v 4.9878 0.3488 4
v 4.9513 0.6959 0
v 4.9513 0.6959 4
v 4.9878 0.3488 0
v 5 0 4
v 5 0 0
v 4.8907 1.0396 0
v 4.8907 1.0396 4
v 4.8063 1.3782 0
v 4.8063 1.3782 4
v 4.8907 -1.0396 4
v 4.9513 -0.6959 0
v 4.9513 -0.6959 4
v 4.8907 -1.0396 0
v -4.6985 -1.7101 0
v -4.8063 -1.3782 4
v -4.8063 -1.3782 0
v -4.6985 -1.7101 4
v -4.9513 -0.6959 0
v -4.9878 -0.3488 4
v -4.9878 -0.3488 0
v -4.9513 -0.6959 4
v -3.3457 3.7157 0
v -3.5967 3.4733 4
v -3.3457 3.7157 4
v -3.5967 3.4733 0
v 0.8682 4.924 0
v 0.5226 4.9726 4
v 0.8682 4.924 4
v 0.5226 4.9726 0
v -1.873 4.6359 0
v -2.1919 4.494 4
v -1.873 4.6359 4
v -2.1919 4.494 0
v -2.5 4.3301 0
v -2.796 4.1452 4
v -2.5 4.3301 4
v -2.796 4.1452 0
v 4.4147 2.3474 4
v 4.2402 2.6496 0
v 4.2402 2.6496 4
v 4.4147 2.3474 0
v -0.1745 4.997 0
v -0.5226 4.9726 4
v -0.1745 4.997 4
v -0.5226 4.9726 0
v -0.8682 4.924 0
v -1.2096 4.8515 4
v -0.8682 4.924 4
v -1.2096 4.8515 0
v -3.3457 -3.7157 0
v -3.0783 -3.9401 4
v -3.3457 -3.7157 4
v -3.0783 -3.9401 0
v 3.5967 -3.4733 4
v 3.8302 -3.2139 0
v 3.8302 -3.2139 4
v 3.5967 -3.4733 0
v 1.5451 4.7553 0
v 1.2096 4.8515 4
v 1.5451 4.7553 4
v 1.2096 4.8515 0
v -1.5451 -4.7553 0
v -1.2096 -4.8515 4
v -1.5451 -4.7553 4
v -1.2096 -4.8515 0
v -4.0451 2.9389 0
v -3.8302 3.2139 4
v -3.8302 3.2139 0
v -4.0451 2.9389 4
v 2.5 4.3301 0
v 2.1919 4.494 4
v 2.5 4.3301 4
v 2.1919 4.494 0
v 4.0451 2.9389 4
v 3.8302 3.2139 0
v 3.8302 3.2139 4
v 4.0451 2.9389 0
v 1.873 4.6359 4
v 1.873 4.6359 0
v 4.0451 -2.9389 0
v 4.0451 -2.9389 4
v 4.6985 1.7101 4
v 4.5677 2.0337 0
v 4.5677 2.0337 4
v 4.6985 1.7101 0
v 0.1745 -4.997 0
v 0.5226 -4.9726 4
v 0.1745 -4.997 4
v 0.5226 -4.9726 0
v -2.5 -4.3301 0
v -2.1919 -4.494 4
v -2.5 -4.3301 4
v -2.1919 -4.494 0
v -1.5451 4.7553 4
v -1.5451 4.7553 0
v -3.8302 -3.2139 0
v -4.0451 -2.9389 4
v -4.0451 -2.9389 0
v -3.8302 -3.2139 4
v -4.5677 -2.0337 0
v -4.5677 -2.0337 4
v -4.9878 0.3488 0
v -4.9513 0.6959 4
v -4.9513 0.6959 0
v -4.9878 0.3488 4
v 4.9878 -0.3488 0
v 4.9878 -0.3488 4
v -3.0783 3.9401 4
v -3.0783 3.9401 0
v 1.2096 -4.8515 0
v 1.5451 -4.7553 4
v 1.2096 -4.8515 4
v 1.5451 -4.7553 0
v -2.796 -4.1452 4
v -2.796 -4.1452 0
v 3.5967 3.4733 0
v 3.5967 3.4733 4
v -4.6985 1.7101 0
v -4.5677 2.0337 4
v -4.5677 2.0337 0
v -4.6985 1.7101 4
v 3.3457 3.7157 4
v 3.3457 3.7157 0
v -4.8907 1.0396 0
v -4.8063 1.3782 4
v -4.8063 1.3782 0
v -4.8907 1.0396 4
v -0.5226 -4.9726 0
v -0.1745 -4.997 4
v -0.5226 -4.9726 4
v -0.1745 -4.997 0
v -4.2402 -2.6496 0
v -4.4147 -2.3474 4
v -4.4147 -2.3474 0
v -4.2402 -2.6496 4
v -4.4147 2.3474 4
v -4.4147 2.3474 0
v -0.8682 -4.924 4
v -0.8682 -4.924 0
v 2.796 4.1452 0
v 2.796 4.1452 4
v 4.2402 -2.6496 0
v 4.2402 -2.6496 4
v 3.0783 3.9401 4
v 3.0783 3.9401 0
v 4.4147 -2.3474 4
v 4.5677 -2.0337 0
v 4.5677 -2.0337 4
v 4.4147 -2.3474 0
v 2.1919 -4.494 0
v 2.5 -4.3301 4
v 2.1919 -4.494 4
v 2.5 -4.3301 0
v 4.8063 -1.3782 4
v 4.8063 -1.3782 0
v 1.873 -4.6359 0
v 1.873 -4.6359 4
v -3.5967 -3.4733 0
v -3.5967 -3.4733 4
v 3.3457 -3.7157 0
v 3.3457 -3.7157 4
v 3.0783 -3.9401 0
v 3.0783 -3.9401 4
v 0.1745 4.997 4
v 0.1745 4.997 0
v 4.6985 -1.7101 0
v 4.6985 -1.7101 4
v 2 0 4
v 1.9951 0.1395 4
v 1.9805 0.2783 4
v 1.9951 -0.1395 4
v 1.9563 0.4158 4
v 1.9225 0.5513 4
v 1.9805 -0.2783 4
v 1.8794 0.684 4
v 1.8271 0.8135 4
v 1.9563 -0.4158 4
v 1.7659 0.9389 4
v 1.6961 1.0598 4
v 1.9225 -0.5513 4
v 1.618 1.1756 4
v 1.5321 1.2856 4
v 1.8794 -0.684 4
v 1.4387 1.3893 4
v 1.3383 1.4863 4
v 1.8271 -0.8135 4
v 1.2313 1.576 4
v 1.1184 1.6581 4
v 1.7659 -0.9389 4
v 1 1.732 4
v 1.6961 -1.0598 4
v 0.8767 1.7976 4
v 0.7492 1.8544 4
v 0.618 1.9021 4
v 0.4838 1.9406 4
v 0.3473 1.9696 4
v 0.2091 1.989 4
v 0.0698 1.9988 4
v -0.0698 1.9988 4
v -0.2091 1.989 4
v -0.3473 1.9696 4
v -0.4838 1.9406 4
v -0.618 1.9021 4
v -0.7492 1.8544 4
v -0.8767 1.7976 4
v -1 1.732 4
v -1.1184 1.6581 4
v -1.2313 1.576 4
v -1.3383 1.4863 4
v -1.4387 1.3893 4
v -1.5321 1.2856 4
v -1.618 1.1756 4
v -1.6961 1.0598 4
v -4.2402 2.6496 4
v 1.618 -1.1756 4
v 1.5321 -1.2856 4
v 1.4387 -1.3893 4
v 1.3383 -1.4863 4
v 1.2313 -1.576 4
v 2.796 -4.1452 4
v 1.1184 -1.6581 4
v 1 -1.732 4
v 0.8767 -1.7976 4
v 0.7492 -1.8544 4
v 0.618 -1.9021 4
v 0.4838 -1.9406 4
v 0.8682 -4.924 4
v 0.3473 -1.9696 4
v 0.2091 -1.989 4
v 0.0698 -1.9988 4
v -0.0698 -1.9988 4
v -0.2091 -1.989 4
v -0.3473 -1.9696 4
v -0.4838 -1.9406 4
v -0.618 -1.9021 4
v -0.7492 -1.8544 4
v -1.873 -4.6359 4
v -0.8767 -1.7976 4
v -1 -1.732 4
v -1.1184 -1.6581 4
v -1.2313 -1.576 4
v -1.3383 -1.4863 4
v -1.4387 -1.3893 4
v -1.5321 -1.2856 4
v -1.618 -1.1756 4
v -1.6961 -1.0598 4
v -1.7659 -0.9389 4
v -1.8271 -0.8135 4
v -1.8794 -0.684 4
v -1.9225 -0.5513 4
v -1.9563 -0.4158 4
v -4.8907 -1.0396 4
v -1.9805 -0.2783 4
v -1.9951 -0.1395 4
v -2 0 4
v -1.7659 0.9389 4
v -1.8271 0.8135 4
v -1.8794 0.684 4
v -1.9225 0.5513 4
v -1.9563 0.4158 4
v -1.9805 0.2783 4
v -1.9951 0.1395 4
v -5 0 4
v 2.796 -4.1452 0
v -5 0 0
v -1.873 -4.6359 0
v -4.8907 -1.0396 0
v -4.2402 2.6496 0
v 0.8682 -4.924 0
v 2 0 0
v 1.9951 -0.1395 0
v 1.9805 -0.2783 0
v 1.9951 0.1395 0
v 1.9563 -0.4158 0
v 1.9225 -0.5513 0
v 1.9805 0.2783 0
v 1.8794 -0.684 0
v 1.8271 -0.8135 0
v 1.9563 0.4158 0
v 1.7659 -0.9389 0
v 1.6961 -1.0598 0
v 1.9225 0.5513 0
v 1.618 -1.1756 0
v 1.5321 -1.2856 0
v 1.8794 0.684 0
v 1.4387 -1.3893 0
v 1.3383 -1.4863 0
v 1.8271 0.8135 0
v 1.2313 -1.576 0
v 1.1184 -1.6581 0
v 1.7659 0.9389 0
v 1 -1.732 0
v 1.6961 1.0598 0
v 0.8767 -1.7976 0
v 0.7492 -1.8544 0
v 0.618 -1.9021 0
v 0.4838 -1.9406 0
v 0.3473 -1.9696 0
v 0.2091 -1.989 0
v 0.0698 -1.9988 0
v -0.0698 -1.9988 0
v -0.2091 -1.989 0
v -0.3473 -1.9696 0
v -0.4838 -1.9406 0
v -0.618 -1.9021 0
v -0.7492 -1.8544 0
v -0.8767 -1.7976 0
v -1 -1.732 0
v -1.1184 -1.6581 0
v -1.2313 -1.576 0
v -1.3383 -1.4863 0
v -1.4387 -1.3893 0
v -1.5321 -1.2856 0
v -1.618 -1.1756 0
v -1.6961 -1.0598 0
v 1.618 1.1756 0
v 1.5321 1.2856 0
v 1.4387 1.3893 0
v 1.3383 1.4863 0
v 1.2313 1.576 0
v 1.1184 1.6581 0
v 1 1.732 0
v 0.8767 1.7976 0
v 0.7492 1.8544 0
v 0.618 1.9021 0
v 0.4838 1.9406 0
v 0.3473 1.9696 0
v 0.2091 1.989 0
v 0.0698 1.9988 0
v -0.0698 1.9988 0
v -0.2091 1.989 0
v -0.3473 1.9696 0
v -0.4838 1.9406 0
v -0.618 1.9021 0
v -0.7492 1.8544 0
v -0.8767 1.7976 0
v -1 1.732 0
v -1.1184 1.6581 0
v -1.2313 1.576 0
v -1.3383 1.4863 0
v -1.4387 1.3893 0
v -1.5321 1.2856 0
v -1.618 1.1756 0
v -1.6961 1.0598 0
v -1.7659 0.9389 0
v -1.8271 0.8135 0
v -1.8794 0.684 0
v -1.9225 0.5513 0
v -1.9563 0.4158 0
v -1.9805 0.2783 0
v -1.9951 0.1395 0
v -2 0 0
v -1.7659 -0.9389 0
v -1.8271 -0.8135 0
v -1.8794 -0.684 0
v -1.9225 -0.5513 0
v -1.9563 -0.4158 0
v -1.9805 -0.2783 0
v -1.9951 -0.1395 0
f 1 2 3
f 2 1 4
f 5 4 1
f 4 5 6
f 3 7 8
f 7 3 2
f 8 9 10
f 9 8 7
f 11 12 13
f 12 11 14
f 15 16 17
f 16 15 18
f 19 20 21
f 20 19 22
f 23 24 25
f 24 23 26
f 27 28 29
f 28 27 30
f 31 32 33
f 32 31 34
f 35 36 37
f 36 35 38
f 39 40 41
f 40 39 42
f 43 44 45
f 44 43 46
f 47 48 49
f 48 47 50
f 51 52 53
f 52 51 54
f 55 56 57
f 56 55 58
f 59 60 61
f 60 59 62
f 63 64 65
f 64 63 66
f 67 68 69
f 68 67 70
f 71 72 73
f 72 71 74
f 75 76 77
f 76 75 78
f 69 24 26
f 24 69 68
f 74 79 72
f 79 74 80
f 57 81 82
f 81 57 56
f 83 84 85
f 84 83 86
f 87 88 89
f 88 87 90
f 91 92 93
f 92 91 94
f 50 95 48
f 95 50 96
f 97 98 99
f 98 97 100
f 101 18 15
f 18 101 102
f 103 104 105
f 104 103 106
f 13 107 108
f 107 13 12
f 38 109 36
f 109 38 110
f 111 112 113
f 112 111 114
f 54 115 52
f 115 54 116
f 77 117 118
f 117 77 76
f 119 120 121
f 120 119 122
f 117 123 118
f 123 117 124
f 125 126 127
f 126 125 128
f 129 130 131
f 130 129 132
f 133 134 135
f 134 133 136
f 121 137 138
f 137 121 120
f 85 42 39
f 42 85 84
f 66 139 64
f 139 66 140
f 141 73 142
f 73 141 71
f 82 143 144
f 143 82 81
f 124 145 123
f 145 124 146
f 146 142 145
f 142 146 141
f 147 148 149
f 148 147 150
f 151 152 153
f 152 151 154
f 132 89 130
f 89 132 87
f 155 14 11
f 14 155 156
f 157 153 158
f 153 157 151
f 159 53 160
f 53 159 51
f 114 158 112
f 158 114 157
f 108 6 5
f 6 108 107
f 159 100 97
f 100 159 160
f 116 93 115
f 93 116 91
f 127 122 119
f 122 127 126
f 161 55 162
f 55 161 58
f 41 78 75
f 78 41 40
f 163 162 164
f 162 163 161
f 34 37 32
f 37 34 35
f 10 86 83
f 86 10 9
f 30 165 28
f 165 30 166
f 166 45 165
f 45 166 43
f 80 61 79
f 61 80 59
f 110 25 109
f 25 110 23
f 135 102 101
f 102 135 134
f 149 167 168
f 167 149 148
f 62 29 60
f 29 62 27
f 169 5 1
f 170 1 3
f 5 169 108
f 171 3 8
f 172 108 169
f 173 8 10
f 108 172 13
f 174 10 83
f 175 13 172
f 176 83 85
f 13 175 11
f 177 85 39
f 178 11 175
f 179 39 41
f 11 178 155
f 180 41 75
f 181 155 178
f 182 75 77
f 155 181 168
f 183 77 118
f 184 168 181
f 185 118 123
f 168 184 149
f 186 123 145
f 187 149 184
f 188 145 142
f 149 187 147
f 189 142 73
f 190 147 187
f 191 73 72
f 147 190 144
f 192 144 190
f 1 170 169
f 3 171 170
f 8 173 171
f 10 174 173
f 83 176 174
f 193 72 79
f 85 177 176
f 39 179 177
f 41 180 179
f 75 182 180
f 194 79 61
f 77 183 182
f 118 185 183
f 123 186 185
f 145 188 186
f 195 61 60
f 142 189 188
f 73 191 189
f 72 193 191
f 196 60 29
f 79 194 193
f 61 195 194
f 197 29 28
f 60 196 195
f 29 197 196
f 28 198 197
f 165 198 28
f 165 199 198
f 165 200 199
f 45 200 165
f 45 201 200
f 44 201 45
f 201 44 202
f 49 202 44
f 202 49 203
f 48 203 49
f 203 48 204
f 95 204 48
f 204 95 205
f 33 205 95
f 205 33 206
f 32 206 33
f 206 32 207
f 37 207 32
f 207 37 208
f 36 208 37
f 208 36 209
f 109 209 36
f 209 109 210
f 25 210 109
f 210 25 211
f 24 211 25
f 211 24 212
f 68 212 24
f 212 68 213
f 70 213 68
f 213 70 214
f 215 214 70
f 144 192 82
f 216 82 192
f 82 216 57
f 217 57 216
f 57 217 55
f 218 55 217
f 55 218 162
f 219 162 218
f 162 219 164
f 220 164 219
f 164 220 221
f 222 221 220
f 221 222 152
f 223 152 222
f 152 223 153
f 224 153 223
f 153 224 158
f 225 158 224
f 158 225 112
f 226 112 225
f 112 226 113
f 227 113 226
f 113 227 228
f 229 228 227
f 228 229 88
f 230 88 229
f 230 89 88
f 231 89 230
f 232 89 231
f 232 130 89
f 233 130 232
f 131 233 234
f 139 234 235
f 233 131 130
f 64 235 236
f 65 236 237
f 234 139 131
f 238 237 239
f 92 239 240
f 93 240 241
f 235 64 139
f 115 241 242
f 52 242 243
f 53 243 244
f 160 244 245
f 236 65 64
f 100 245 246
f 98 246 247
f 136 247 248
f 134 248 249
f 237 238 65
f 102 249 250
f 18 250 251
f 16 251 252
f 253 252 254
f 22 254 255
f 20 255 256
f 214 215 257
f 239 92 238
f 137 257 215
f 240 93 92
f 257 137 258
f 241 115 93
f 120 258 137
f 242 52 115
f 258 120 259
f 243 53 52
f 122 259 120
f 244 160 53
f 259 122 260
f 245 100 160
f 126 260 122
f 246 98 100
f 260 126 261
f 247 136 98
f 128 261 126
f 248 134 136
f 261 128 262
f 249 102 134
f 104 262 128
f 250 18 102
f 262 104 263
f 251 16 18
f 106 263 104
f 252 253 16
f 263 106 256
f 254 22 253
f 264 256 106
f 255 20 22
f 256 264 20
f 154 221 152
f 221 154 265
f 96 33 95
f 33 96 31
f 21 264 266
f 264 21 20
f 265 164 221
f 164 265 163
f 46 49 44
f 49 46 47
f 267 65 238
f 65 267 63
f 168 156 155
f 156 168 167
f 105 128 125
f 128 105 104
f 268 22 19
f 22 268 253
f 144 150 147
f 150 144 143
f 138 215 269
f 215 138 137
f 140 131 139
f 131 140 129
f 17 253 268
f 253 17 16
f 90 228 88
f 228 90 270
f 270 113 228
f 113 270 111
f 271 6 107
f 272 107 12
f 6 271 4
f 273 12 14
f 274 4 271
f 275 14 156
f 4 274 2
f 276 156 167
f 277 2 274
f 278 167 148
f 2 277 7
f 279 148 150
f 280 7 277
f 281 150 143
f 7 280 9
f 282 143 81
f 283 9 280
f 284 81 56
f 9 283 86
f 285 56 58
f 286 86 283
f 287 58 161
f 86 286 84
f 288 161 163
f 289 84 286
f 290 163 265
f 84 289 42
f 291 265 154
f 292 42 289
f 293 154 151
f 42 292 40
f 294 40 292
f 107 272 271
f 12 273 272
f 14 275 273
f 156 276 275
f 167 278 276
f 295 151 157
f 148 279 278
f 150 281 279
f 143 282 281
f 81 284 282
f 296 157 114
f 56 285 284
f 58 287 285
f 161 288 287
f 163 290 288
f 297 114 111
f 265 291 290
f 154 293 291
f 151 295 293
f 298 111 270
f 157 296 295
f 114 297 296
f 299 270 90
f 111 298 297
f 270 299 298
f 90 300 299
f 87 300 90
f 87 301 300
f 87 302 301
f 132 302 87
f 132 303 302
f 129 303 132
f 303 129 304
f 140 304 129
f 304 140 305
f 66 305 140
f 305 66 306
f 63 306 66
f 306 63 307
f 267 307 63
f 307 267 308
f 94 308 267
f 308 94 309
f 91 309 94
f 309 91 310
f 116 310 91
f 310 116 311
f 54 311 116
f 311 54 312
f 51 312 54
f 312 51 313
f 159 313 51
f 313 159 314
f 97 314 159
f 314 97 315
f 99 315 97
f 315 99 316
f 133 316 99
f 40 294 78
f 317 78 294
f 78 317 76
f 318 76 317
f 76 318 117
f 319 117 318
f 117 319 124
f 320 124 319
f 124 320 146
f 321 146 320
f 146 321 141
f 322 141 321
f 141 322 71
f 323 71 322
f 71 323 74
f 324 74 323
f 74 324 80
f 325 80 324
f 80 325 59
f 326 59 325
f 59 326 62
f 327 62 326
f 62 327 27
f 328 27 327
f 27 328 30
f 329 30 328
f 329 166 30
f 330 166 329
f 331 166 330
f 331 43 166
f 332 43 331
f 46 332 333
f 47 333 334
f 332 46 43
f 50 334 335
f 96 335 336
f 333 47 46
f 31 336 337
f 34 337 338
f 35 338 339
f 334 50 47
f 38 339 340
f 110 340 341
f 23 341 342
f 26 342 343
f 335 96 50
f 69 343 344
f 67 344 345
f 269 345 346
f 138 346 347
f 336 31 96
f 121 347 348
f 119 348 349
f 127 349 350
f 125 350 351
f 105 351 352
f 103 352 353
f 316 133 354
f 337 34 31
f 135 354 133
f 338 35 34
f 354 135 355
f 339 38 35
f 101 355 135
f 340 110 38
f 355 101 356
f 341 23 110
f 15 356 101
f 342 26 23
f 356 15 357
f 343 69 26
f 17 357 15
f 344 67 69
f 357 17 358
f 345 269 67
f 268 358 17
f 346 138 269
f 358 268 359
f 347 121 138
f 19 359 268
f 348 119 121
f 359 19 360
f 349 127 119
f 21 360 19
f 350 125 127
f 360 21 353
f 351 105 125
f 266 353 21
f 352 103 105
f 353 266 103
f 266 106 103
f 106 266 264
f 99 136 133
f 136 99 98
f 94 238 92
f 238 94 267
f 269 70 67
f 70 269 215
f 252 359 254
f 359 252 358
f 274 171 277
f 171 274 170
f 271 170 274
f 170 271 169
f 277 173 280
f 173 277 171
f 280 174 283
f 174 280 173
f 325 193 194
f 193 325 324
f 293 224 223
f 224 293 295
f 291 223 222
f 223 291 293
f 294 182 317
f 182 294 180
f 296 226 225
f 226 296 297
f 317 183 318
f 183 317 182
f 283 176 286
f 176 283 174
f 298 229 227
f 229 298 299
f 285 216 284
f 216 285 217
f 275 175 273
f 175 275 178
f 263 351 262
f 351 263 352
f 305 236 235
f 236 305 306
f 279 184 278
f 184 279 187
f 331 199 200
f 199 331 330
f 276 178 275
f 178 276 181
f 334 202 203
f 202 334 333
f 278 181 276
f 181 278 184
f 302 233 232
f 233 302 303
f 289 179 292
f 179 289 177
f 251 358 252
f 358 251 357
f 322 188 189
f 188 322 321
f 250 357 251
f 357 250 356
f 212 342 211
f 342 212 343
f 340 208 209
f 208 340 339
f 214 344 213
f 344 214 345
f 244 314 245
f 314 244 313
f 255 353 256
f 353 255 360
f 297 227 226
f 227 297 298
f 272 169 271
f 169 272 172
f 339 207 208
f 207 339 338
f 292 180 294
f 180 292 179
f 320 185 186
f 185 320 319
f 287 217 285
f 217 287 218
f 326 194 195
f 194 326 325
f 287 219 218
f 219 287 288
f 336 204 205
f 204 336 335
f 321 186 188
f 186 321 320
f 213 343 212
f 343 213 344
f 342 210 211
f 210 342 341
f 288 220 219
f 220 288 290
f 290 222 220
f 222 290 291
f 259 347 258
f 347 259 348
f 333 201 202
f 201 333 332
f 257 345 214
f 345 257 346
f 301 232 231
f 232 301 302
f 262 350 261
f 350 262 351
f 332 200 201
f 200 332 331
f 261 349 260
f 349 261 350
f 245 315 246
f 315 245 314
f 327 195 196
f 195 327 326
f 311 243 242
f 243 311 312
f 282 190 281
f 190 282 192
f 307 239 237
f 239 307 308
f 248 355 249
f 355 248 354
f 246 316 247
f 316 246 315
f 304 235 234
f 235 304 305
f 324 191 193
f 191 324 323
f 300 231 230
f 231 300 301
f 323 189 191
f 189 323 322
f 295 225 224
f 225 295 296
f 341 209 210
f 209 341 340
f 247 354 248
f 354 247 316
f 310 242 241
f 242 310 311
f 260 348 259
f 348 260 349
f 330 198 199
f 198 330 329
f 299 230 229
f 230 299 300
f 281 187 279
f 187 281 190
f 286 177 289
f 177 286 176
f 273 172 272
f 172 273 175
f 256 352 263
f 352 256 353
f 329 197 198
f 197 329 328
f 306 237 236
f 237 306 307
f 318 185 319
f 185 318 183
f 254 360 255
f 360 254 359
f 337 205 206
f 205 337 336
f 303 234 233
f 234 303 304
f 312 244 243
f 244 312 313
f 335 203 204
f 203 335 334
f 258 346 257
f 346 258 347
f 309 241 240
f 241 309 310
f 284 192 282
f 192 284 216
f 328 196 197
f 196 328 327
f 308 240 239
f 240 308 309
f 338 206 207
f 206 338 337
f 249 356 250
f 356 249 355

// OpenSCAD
$fn = 90;

difference() {
    cylinder(d=10, h=4);
    // M3 screw
    cylinder(d=4, h=4);
}
